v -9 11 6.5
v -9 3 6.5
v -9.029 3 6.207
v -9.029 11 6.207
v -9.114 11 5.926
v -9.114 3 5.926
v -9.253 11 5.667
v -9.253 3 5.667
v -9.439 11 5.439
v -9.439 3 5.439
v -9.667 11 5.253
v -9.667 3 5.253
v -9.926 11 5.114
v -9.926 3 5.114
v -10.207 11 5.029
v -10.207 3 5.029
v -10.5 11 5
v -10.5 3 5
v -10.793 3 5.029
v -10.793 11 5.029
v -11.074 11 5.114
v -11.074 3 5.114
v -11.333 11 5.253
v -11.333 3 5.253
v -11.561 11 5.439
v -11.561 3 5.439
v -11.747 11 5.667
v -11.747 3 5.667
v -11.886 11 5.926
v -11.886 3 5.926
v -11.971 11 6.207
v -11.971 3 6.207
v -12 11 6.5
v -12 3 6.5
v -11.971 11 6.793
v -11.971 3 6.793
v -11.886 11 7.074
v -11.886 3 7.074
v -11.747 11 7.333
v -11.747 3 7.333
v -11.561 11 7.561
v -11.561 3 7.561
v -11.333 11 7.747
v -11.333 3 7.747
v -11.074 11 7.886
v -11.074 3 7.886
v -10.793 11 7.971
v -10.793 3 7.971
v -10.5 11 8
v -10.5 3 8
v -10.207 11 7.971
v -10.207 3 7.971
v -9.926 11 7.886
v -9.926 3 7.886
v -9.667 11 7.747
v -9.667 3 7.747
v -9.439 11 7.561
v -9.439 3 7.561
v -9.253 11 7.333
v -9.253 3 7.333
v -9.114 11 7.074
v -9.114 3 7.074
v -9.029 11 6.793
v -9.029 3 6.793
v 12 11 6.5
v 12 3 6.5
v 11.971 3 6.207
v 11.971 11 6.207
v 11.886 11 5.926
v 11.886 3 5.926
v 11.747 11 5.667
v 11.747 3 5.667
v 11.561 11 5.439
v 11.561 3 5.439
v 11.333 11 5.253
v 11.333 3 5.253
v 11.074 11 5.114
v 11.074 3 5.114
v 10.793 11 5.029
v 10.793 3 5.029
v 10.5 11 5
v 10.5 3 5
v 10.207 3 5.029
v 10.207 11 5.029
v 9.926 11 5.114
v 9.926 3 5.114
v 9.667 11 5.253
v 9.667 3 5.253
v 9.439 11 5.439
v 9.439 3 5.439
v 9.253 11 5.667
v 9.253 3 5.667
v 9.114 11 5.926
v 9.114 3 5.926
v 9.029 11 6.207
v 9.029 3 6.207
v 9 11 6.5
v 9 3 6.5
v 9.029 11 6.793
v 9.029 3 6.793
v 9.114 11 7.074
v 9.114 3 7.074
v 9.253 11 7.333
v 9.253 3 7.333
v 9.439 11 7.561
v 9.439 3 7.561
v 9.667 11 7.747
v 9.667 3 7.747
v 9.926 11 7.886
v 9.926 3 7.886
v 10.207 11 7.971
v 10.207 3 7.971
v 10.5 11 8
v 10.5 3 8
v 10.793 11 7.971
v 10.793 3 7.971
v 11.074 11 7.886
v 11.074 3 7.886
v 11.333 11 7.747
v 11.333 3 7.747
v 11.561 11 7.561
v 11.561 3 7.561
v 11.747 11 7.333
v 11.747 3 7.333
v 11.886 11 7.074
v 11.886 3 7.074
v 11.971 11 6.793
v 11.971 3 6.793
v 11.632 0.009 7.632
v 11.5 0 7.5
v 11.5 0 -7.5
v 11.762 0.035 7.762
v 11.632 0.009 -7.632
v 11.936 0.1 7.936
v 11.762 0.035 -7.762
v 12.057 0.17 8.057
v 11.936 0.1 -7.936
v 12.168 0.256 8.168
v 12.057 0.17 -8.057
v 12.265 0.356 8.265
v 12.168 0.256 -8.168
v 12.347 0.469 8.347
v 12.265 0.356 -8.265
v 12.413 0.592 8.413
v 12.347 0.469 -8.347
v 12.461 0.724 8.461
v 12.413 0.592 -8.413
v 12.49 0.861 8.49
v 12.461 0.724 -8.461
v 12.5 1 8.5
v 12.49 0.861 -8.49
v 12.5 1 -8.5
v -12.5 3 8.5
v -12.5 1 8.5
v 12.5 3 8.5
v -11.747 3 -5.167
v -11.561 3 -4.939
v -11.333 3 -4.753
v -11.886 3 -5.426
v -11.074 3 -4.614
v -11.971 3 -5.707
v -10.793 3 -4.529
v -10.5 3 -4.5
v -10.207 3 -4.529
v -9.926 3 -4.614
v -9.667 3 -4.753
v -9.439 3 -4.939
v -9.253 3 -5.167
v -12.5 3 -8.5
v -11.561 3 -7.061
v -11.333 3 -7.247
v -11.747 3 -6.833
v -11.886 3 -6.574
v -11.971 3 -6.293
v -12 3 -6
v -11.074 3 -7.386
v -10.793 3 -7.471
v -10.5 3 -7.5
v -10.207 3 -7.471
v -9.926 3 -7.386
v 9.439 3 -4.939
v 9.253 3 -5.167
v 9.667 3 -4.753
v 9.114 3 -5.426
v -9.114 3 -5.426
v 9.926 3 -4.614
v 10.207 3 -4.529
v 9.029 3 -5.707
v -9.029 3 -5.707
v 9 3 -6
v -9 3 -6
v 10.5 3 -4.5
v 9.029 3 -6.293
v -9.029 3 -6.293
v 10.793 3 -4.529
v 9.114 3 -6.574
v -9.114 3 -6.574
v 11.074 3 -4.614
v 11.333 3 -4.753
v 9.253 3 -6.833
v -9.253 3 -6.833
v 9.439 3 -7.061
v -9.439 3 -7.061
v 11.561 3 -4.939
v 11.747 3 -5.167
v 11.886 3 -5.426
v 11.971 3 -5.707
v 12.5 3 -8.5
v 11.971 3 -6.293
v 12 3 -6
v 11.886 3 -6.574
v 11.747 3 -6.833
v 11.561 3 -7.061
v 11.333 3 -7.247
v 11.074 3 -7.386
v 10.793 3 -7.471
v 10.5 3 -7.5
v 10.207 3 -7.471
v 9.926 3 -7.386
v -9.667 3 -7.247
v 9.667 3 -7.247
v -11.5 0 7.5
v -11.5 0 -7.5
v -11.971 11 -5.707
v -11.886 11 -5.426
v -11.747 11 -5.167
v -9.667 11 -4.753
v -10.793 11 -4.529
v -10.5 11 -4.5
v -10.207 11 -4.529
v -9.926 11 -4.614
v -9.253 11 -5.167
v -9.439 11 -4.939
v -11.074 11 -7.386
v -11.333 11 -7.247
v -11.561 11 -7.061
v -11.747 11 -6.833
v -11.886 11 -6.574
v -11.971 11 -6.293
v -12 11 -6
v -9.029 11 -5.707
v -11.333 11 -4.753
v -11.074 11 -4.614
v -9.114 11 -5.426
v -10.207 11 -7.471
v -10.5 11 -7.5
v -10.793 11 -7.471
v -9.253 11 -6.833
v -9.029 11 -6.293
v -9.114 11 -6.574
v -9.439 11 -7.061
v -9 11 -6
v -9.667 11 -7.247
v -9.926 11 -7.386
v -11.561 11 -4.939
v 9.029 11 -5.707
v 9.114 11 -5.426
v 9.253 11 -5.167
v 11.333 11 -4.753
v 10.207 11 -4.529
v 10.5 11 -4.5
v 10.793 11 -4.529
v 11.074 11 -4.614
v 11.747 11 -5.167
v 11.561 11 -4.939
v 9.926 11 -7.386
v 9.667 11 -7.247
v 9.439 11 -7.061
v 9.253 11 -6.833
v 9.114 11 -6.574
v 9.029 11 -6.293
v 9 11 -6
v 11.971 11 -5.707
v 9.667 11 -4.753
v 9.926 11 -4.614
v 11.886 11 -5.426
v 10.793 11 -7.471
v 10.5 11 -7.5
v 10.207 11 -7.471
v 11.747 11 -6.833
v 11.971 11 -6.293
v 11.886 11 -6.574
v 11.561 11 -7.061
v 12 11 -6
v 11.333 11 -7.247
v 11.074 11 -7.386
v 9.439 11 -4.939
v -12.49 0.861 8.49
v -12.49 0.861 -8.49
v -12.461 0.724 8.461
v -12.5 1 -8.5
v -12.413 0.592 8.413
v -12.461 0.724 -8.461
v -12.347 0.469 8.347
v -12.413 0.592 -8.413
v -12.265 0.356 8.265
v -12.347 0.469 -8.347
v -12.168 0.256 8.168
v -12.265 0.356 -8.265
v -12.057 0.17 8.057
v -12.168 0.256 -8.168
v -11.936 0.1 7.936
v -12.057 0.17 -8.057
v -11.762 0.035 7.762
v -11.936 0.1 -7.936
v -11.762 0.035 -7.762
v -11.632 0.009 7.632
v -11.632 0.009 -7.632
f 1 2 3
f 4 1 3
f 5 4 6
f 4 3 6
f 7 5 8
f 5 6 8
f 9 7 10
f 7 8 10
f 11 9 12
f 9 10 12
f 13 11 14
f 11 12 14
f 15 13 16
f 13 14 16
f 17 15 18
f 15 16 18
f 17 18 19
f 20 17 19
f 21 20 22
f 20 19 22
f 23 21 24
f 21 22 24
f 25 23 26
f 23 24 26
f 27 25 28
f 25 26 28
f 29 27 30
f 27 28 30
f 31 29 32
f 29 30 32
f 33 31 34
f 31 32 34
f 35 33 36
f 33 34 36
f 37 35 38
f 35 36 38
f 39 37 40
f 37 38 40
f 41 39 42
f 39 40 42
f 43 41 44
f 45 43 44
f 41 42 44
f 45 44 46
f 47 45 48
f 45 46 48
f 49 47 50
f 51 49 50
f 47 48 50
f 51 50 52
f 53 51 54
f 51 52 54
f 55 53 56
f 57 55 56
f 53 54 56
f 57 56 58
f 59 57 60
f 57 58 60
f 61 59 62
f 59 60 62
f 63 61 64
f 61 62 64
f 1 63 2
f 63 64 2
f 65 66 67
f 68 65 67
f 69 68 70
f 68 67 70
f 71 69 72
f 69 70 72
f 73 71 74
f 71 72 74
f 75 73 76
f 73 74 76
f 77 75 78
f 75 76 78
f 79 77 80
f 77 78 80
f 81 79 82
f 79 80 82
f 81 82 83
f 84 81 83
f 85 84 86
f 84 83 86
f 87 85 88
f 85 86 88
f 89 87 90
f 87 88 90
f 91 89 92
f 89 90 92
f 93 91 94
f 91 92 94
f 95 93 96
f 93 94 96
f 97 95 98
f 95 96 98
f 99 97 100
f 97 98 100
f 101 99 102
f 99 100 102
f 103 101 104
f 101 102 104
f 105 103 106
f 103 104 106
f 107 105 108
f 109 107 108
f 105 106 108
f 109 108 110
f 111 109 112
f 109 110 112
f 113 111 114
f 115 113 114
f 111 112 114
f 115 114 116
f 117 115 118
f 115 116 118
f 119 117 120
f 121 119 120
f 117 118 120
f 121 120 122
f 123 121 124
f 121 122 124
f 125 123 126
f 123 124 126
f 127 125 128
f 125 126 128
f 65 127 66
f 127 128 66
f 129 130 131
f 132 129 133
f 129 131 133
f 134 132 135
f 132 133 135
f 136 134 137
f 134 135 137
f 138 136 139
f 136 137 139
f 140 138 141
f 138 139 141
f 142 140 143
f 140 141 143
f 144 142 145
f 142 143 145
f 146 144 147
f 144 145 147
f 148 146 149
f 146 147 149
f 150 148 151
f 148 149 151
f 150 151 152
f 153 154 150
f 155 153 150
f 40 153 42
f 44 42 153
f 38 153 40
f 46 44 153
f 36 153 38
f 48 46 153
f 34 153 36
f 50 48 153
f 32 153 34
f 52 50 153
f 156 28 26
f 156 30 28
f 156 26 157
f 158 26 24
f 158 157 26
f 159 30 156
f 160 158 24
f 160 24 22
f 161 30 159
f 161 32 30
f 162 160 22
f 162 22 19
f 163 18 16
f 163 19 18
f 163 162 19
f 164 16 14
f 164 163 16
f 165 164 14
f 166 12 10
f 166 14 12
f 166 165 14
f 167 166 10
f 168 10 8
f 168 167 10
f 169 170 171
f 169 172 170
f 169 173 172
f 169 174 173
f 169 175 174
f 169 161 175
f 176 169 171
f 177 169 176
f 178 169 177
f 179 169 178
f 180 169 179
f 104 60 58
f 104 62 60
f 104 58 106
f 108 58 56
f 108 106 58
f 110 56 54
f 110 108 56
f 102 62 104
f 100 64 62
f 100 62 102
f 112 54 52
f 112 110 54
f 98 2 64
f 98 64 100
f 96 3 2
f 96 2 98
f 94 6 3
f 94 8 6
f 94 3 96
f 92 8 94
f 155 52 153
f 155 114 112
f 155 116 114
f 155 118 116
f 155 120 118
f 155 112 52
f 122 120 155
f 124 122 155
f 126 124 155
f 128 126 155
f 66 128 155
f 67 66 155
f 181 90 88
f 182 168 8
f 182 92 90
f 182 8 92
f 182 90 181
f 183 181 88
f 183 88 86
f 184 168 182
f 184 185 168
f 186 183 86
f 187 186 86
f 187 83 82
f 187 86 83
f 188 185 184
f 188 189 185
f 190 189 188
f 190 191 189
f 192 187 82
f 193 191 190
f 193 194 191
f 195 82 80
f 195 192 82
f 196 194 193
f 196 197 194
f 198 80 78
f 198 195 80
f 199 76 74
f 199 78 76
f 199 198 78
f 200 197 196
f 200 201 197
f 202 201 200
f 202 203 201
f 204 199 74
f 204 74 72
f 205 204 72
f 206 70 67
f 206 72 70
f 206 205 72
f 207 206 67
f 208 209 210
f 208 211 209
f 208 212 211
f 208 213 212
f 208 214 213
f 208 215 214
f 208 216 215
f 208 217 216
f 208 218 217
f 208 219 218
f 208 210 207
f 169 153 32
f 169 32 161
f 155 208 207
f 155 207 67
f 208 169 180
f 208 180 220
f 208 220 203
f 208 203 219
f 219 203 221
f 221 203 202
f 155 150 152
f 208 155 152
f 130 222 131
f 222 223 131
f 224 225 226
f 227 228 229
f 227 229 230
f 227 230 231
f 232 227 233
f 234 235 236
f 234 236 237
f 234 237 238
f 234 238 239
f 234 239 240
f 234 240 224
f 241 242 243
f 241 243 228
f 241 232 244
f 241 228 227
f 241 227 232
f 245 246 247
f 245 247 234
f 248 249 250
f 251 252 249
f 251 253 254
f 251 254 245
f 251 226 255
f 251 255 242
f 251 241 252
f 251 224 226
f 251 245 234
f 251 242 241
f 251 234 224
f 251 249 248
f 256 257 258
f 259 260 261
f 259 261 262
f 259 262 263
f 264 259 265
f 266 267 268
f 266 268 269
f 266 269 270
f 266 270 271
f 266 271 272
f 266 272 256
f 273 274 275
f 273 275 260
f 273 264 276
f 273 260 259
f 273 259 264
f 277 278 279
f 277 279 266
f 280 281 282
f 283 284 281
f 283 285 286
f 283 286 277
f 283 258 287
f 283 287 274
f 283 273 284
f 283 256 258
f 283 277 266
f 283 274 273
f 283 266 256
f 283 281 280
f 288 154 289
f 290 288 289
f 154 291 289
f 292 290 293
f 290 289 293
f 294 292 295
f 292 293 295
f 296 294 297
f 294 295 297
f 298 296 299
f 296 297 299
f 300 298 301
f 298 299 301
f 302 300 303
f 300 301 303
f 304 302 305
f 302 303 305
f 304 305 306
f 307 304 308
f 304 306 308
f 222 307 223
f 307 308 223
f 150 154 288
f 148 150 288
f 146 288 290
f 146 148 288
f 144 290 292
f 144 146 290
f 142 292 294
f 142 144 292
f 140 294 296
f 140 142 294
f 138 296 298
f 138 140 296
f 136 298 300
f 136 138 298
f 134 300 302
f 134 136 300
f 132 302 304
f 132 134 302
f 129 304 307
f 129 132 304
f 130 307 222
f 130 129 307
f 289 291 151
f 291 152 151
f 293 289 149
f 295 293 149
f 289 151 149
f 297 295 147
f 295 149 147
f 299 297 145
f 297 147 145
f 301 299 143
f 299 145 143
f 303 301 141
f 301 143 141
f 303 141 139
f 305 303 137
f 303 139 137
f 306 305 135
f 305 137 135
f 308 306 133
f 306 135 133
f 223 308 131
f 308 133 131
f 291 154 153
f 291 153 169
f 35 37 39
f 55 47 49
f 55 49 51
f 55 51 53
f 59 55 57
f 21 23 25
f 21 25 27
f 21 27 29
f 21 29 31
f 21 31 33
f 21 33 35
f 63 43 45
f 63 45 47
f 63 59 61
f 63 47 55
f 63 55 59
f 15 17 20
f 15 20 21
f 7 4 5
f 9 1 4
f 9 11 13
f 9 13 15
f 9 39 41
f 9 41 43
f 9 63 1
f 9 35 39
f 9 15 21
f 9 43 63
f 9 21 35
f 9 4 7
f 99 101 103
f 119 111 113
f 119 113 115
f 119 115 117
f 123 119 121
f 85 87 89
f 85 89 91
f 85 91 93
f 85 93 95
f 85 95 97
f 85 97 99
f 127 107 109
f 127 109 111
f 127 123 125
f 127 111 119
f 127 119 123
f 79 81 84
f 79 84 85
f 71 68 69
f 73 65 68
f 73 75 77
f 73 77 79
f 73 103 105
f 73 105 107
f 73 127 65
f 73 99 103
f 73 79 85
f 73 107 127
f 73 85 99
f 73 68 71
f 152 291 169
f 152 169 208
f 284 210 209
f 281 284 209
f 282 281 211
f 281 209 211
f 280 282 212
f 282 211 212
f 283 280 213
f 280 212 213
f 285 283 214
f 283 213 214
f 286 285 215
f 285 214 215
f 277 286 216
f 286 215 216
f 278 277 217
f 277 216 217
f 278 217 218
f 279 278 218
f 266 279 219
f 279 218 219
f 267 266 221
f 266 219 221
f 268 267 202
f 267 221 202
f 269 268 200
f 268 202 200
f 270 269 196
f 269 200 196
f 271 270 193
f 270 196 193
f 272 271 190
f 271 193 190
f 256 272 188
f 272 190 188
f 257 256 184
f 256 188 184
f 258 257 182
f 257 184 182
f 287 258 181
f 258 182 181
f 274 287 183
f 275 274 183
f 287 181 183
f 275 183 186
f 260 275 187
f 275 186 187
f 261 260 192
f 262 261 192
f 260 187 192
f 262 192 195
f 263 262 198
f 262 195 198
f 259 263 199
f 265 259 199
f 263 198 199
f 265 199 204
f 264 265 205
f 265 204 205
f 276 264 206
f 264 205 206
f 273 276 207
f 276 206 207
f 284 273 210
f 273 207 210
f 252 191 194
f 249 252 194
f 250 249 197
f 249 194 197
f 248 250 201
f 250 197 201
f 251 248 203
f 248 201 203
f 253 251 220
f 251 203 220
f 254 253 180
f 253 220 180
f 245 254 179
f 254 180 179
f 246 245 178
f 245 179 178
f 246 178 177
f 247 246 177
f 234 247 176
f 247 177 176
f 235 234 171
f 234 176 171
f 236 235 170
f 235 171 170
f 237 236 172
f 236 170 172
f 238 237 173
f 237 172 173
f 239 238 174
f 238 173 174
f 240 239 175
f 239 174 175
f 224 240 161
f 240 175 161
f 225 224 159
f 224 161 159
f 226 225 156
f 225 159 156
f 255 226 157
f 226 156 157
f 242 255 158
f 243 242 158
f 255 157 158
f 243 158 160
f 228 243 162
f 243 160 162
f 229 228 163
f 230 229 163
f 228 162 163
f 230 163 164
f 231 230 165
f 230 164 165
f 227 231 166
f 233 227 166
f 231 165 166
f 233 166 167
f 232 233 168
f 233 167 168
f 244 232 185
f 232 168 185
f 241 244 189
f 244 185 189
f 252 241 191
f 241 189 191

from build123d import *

# Parameters (mm, degrees)
SKETCH1_W           = 25
SKETCH1_H           = 17
BOSS_EXTRUDE1_DEPTH = 3
SKETCH2_R           = 1.5
BOSS_EXTRUDE2_DEPTH = 8
FILLET3_R           = 1


with BuildPart() as part:
    # Sketch1 → Boss-Extrude1 (new body)
    with BuildSketch(Plane(origin=(0, 0, 0), x_dir=(1, 0, 0), z_dir=(0, 1, 0))):
        Rectangle(SKETCH1_W, SKETCH1_H)
    extrude(amount=BOSS_EXTRUDE1_DEPTH)

    # Sketch2 → Boss-Extrude2 (add)
    with BuildSketch(Plane(origin=(0, 3, 0), x_dir=(1, 0, 0), z_dir=(0, 1, 0))):
        with Locations((-10.5, -6.5)):
            Circle(SKETCH2_R)
        with Locations((10.5, -6.5)):
            Circle(SKETCH2_R)
        with Locations((10.5, 5.999999892)):
            Circle(SKETCH2_R)
        with Locations((-10.5, 5.999999892)):
            Circle(SKETCH2_R)
    extrude(amount=BOSS_EXTRUDE2_DEPTH)

    # Fillet3
    fillet3_edges = [part.edges().sort_by_distance(p)[0] for p in [
        (0, 0, 8.5),
        (-12.5, 0, 0),
        (0, 0, -8.5),
        (12.5, 0, 0),
    ]]
    fillet(fillet3_edges, radius=FILLET3_R)


solid = part.part
